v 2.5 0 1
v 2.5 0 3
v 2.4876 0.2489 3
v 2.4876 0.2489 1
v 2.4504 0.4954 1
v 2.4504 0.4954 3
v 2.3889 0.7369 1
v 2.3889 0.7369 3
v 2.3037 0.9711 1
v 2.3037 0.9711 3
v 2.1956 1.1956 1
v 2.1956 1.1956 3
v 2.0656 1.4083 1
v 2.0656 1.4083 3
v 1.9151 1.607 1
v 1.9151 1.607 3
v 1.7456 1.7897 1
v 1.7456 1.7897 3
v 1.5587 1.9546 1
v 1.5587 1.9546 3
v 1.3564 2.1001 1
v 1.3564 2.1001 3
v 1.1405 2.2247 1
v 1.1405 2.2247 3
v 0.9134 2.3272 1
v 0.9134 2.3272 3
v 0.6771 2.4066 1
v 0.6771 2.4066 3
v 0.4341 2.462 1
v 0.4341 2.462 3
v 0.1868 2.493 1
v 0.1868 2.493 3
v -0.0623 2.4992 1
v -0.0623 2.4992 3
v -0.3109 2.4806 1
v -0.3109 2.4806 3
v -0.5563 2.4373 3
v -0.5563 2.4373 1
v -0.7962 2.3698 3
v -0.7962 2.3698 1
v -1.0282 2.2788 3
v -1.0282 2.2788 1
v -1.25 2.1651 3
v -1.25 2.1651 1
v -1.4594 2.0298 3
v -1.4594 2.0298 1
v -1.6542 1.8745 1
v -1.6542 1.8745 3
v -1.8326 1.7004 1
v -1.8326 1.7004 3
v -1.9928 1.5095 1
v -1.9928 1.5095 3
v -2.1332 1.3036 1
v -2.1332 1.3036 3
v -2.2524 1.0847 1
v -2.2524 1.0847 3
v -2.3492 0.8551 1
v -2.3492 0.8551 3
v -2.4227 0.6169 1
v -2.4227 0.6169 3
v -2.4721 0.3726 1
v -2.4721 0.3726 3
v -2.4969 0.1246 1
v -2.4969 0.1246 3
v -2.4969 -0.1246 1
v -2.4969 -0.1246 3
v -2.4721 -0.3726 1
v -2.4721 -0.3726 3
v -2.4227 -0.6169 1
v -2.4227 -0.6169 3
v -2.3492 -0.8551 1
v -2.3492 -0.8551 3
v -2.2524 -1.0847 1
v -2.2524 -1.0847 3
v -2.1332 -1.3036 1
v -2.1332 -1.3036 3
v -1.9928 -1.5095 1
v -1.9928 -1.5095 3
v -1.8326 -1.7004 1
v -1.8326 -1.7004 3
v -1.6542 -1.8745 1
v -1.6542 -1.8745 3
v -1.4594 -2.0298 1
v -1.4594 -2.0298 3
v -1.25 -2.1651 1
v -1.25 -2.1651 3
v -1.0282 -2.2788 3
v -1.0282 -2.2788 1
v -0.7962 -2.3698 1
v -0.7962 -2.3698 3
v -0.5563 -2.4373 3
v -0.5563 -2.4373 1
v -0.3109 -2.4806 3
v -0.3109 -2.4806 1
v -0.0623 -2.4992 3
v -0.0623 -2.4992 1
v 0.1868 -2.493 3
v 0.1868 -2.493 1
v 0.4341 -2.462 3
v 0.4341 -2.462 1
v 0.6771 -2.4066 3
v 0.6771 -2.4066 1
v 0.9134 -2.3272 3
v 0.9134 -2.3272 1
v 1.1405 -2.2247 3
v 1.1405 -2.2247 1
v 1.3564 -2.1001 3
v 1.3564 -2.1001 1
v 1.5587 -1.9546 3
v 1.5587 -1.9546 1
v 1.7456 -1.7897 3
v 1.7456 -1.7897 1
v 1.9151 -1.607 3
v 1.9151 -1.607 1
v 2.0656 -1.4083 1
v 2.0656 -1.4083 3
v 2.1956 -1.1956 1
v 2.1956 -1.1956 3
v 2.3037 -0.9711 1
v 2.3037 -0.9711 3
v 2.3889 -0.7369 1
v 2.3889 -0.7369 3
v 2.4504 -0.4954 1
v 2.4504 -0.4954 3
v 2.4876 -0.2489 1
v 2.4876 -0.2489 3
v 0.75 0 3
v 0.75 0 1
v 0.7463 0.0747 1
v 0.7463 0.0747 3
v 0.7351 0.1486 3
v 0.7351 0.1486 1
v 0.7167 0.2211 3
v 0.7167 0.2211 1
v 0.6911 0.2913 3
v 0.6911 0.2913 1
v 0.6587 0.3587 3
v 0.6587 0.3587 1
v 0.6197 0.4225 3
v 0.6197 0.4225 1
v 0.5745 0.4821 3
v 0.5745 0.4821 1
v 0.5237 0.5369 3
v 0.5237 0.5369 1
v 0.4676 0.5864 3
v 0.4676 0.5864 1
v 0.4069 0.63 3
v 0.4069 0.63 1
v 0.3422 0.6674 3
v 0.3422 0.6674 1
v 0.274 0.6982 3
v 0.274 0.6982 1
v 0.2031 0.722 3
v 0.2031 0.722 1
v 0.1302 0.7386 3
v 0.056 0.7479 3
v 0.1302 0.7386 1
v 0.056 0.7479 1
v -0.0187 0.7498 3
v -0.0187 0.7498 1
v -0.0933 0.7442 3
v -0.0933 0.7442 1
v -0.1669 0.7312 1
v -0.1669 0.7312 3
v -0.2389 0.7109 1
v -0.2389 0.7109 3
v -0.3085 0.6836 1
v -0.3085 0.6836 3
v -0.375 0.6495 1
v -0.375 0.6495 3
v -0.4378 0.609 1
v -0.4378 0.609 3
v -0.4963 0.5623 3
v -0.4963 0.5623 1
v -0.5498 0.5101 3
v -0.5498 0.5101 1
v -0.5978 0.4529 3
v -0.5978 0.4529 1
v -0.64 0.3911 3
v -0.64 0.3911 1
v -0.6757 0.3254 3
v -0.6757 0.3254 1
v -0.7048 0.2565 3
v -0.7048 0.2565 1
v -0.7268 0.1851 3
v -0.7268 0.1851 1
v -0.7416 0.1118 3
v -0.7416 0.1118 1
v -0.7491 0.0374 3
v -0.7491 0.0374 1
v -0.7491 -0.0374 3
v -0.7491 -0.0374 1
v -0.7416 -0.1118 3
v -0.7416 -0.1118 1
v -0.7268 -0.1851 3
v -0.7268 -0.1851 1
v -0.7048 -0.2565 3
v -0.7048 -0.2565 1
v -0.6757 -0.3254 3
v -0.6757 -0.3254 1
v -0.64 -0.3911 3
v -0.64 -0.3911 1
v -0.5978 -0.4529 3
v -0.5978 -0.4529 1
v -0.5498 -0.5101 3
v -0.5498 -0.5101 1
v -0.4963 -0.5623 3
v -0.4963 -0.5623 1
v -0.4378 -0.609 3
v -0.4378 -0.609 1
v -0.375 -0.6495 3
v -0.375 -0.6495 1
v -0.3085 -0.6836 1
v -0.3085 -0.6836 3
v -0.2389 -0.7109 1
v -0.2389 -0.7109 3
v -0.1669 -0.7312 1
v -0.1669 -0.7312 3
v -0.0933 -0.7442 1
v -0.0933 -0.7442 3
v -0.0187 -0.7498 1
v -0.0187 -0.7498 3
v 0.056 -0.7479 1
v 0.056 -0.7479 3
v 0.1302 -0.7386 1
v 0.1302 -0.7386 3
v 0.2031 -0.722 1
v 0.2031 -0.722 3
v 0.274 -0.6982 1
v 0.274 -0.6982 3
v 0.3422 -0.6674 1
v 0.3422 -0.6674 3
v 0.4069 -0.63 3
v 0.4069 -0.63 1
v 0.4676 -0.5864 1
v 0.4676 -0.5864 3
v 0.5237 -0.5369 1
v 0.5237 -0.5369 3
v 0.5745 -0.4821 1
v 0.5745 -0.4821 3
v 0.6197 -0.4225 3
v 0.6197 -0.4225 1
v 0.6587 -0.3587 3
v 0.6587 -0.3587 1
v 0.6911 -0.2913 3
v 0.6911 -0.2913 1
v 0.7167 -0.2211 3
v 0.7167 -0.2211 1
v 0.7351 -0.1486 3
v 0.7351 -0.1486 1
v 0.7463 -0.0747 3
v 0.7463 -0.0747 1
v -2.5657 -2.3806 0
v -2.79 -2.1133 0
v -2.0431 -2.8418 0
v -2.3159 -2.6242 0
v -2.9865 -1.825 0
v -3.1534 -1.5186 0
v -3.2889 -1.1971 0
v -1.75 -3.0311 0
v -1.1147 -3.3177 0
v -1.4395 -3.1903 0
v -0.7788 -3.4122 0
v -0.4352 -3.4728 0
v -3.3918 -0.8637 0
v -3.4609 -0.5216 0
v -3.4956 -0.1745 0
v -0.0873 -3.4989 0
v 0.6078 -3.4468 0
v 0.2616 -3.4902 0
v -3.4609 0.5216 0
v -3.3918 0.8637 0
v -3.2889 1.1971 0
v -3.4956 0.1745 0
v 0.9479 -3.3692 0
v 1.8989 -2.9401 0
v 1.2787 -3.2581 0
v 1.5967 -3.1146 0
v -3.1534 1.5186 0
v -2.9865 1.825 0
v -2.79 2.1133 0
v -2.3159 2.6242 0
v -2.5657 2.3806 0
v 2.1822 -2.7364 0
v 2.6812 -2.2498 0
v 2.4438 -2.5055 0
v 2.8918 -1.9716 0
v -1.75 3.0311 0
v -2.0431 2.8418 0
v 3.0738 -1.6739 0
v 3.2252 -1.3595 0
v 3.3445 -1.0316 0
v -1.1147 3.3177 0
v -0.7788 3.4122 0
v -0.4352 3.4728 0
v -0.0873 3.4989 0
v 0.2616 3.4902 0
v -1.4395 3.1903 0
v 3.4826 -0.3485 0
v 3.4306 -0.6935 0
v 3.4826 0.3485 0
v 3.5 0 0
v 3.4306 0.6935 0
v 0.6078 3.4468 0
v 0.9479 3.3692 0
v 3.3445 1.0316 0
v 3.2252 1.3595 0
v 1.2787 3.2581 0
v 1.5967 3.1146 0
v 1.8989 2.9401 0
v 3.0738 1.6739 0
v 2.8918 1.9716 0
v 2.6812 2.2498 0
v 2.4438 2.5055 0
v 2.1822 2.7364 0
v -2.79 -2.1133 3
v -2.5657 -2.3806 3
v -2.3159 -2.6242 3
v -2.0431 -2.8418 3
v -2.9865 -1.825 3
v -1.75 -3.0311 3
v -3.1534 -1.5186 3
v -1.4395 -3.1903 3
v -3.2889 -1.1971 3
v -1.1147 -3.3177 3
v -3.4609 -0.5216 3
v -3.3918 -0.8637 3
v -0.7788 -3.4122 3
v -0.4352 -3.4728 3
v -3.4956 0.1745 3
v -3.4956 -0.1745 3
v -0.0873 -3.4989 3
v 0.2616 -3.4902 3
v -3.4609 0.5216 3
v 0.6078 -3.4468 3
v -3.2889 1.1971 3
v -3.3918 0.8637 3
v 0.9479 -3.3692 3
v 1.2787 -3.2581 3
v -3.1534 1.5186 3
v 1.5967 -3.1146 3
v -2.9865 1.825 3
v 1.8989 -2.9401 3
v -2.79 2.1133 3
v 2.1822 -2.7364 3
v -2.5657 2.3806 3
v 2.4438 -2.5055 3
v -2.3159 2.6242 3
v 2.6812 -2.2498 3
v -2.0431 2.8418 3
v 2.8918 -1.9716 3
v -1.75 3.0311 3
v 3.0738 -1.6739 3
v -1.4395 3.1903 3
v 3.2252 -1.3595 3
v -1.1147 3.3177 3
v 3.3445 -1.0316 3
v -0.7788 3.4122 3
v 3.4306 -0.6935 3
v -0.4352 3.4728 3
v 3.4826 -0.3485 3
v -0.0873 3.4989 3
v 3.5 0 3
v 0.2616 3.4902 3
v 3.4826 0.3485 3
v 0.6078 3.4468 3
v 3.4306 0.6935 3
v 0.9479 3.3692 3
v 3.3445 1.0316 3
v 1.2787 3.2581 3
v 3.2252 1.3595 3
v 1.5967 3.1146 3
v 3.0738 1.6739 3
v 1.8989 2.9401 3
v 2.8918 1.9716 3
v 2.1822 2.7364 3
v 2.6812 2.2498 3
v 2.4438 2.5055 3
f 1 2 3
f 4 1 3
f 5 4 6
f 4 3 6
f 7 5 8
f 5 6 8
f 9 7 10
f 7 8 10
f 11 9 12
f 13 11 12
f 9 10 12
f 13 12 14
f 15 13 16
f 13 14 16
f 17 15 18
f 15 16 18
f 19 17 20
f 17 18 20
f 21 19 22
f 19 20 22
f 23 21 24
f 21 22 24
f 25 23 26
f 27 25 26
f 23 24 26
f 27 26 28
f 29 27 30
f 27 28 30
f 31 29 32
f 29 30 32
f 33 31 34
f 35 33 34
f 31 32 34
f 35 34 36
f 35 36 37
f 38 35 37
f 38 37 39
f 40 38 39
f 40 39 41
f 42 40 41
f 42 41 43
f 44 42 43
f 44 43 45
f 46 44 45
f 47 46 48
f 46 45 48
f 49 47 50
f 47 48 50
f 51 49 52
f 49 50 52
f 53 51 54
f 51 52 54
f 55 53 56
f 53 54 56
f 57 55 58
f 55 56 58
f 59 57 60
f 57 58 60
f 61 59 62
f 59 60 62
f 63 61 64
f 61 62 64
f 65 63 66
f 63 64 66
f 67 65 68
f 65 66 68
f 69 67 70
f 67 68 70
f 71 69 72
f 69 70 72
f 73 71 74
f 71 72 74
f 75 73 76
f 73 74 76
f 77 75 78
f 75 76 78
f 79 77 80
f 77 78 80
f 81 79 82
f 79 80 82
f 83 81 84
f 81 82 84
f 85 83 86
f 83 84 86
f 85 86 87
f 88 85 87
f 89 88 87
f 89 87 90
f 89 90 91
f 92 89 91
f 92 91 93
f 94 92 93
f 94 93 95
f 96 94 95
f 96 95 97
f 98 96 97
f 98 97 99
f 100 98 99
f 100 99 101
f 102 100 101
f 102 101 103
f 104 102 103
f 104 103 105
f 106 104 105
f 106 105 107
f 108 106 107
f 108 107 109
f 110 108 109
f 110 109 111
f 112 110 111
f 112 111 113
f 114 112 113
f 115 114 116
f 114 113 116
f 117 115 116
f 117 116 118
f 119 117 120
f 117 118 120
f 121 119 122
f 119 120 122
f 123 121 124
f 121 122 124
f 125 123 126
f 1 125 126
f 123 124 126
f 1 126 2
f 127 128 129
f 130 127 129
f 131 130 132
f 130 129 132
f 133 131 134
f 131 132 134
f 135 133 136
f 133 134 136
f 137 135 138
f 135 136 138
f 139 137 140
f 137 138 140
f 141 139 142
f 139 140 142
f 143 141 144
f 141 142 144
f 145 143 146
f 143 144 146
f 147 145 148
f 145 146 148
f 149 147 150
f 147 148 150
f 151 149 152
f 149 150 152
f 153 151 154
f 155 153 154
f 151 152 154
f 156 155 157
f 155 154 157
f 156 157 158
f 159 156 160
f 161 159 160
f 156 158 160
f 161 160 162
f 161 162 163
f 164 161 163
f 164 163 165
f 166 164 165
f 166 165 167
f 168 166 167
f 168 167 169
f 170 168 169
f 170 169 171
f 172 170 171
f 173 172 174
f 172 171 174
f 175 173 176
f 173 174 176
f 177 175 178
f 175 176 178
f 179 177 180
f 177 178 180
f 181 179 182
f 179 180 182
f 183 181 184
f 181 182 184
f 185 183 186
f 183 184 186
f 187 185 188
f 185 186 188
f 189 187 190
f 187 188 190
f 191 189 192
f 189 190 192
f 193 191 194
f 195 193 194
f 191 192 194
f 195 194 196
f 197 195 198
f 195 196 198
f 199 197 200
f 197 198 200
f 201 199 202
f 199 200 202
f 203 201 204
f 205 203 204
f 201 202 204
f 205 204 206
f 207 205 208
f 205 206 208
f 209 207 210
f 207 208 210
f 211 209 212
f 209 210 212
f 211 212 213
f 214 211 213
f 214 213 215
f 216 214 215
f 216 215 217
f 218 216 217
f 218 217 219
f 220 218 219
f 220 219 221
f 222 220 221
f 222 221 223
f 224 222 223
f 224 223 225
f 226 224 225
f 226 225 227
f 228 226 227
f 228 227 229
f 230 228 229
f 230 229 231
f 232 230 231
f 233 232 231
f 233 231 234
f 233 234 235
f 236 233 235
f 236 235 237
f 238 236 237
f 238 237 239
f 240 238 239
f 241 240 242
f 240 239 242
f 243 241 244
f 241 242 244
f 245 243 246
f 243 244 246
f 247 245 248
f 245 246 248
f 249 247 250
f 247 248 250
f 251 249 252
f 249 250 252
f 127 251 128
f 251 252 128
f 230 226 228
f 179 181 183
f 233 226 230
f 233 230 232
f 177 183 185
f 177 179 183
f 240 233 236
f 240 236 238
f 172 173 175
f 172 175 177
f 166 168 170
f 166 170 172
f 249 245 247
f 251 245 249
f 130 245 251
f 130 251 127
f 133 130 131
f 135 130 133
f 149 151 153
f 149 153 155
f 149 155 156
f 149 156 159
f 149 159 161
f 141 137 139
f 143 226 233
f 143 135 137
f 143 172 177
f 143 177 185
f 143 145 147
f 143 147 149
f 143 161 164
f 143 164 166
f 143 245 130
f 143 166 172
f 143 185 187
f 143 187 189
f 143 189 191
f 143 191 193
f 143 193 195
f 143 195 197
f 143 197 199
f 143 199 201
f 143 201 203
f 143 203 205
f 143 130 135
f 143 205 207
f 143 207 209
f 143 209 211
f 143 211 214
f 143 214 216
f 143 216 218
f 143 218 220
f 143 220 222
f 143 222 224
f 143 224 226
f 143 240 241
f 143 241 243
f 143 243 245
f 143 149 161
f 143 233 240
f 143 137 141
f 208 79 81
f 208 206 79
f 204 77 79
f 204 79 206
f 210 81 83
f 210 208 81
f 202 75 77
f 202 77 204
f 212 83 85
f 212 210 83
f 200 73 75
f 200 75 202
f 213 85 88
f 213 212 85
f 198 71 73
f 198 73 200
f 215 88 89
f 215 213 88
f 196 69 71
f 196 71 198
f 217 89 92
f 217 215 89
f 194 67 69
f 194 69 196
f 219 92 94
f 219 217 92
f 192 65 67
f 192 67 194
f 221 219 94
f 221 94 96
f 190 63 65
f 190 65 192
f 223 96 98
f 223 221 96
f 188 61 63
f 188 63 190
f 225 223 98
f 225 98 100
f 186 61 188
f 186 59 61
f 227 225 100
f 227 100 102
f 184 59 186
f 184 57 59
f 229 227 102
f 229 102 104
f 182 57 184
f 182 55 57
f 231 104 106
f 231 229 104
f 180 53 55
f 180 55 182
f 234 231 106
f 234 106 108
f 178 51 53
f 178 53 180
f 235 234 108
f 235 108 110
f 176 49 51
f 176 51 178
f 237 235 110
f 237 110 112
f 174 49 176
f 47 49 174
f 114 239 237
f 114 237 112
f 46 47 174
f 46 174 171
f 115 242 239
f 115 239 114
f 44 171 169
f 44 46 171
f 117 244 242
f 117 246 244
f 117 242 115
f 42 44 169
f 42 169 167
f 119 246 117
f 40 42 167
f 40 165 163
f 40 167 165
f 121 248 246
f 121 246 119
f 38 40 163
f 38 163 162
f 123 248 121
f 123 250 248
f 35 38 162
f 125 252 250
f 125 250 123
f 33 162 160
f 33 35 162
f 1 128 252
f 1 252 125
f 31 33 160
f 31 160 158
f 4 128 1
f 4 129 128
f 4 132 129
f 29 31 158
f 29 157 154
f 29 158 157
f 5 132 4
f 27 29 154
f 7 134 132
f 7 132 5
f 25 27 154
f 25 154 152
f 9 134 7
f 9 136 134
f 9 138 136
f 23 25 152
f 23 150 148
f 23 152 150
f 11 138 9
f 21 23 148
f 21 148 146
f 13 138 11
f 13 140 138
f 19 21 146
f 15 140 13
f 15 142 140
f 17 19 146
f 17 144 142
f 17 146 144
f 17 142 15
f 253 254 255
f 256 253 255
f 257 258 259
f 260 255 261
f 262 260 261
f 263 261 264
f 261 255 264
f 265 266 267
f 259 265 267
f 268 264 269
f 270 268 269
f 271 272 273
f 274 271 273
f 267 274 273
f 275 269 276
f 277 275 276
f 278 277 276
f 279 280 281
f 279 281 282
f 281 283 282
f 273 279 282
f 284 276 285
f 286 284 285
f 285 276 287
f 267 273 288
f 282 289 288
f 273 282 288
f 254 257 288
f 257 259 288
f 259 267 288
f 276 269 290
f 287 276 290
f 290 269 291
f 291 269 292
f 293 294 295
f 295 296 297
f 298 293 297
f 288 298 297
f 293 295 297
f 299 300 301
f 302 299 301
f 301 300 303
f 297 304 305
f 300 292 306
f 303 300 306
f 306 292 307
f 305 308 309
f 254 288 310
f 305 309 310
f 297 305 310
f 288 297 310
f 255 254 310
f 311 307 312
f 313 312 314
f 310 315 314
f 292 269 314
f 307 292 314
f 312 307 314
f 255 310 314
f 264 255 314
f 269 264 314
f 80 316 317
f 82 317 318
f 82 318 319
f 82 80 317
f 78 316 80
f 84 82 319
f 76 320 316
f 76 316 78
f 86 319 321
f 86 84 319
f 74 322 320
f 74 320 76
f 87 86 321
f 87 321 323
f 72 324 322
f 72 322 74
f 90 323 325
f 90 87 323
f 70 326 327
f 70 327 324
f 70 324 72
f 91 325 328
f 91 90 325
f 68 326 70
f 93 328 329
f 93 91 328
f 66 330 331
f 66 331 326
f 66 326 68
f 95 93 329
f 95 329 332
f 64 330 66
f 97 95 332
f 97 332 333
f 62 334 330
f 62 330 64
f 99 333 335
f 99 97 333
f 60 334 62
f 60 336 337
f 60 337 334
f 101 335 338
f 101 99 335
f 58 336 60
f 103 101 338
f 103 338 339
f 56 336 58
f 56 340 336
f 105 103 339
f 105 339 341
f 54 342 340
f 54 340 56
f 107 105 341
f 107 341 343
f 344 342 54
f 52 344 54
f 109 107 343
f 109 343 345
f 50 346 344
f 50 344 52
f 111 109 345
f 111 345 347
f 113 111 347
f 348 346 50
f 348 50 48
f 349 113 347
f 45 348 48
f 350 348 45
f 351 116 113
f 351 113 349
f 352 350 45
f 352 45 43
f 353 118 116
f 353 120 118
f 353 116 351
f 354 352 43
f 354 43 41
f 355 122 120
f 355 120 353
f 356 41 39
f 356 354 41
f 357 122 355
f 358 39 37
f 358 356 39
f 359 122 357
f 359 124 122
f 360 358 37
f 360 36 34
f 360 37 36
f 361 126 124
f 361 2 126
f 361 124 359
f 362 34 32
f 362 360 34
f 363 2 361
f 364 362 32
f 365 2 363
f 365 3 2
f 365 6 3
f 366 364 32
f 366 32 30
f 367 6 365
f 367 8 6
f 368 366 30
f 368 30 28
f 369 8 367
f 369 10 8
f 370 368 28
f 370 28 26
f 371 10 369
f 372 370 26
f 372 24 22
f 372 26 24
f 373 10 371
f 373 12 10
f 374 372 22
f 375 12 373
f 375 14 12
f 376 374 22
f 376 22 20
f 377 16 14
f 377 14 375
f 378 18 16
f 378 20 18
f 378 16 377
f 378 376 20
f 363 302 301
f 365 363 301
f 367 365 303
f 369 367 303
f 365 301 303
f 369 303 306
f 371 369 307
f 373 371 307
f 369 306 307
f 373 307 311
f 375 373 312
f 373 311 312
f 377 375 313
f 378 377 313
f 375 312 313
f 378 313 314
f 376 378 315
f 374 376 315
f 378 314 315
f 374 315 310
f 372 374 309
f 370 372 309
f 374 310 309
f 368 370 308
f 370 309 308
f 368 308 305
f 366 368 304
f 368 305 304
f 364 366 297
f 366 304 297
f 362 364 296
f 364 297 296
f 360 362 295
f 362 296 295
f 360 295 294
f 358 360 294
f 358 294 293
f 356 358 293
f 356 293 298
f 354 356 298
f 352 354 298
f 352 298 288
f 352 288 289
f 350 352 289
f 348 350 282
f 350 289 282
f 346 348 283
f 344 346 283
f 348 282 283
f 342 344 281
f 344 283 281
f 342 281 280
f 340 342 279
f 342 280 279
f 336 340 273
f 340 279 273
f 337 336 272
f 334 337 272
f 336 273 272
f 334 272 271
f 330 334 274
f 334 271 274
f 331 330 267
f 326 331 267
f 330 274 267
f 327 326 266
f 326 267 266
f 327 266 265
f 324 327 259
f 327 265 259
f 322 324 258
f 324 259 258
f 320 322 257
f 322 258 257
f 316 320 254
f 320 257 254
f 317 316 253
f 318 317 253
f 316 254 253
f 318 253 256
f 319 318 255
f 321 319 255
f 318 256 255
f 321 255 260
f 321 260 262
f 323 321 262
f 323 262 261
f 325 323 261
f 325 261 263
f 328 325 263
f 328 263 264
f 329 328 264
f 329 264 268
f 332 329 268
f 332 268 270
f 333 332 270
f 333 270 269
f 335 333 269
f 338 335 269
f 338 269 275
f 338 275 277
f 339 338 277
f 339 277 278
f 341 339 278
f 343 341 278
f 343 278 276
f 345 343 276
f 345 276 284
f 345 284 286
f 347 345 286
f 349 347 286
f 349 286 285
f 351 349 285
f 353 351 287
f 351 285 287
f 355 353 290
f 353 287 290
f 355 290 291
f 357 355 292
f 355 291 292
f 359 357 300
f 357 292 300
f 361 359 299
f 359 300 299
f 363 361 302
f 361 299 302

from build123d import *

# Parameters (mm, degrees)
CROQUIS1_R              = 3.5
SALIENTE_EXTRUIR1_DEPTH = 3
CROQUIS2_R              = 2.5
CORTAR_EXTRUIR1_DEPTH   = 2
CROQUIS3_R              = 0.75
SALIENTE_EXTRUIR2_DEPTH = 2


with BuildPart() as part:
    # Croquis1 → Saliente-Extruir1 (new body)
    with BuildSketch(Plane.XY):
        Circle(CROQUIS1_R)
    extrude(amount=SALIENTE_EXTRUIR1_DEPTH)

    # Croquis2 → Cortar-Extruir1 (cut)
    with BuildSketch(Plane.XY.offset(3)):
        Circle(CROQUIS2_R)
    extrude(amount=-CORTAR_EXTRUIR1_DEPTH, mode=Mode.SUBTRACT)

    # Croquis3 → Saliente-Extruir2 (add)
    with BuildSketch(Plane.XY.offset(1)):
        Circle(CROQUIS3_R)
    extrude(amount=SALIENTE_EXTRUIR2_DEPTH)


solid = part.part
